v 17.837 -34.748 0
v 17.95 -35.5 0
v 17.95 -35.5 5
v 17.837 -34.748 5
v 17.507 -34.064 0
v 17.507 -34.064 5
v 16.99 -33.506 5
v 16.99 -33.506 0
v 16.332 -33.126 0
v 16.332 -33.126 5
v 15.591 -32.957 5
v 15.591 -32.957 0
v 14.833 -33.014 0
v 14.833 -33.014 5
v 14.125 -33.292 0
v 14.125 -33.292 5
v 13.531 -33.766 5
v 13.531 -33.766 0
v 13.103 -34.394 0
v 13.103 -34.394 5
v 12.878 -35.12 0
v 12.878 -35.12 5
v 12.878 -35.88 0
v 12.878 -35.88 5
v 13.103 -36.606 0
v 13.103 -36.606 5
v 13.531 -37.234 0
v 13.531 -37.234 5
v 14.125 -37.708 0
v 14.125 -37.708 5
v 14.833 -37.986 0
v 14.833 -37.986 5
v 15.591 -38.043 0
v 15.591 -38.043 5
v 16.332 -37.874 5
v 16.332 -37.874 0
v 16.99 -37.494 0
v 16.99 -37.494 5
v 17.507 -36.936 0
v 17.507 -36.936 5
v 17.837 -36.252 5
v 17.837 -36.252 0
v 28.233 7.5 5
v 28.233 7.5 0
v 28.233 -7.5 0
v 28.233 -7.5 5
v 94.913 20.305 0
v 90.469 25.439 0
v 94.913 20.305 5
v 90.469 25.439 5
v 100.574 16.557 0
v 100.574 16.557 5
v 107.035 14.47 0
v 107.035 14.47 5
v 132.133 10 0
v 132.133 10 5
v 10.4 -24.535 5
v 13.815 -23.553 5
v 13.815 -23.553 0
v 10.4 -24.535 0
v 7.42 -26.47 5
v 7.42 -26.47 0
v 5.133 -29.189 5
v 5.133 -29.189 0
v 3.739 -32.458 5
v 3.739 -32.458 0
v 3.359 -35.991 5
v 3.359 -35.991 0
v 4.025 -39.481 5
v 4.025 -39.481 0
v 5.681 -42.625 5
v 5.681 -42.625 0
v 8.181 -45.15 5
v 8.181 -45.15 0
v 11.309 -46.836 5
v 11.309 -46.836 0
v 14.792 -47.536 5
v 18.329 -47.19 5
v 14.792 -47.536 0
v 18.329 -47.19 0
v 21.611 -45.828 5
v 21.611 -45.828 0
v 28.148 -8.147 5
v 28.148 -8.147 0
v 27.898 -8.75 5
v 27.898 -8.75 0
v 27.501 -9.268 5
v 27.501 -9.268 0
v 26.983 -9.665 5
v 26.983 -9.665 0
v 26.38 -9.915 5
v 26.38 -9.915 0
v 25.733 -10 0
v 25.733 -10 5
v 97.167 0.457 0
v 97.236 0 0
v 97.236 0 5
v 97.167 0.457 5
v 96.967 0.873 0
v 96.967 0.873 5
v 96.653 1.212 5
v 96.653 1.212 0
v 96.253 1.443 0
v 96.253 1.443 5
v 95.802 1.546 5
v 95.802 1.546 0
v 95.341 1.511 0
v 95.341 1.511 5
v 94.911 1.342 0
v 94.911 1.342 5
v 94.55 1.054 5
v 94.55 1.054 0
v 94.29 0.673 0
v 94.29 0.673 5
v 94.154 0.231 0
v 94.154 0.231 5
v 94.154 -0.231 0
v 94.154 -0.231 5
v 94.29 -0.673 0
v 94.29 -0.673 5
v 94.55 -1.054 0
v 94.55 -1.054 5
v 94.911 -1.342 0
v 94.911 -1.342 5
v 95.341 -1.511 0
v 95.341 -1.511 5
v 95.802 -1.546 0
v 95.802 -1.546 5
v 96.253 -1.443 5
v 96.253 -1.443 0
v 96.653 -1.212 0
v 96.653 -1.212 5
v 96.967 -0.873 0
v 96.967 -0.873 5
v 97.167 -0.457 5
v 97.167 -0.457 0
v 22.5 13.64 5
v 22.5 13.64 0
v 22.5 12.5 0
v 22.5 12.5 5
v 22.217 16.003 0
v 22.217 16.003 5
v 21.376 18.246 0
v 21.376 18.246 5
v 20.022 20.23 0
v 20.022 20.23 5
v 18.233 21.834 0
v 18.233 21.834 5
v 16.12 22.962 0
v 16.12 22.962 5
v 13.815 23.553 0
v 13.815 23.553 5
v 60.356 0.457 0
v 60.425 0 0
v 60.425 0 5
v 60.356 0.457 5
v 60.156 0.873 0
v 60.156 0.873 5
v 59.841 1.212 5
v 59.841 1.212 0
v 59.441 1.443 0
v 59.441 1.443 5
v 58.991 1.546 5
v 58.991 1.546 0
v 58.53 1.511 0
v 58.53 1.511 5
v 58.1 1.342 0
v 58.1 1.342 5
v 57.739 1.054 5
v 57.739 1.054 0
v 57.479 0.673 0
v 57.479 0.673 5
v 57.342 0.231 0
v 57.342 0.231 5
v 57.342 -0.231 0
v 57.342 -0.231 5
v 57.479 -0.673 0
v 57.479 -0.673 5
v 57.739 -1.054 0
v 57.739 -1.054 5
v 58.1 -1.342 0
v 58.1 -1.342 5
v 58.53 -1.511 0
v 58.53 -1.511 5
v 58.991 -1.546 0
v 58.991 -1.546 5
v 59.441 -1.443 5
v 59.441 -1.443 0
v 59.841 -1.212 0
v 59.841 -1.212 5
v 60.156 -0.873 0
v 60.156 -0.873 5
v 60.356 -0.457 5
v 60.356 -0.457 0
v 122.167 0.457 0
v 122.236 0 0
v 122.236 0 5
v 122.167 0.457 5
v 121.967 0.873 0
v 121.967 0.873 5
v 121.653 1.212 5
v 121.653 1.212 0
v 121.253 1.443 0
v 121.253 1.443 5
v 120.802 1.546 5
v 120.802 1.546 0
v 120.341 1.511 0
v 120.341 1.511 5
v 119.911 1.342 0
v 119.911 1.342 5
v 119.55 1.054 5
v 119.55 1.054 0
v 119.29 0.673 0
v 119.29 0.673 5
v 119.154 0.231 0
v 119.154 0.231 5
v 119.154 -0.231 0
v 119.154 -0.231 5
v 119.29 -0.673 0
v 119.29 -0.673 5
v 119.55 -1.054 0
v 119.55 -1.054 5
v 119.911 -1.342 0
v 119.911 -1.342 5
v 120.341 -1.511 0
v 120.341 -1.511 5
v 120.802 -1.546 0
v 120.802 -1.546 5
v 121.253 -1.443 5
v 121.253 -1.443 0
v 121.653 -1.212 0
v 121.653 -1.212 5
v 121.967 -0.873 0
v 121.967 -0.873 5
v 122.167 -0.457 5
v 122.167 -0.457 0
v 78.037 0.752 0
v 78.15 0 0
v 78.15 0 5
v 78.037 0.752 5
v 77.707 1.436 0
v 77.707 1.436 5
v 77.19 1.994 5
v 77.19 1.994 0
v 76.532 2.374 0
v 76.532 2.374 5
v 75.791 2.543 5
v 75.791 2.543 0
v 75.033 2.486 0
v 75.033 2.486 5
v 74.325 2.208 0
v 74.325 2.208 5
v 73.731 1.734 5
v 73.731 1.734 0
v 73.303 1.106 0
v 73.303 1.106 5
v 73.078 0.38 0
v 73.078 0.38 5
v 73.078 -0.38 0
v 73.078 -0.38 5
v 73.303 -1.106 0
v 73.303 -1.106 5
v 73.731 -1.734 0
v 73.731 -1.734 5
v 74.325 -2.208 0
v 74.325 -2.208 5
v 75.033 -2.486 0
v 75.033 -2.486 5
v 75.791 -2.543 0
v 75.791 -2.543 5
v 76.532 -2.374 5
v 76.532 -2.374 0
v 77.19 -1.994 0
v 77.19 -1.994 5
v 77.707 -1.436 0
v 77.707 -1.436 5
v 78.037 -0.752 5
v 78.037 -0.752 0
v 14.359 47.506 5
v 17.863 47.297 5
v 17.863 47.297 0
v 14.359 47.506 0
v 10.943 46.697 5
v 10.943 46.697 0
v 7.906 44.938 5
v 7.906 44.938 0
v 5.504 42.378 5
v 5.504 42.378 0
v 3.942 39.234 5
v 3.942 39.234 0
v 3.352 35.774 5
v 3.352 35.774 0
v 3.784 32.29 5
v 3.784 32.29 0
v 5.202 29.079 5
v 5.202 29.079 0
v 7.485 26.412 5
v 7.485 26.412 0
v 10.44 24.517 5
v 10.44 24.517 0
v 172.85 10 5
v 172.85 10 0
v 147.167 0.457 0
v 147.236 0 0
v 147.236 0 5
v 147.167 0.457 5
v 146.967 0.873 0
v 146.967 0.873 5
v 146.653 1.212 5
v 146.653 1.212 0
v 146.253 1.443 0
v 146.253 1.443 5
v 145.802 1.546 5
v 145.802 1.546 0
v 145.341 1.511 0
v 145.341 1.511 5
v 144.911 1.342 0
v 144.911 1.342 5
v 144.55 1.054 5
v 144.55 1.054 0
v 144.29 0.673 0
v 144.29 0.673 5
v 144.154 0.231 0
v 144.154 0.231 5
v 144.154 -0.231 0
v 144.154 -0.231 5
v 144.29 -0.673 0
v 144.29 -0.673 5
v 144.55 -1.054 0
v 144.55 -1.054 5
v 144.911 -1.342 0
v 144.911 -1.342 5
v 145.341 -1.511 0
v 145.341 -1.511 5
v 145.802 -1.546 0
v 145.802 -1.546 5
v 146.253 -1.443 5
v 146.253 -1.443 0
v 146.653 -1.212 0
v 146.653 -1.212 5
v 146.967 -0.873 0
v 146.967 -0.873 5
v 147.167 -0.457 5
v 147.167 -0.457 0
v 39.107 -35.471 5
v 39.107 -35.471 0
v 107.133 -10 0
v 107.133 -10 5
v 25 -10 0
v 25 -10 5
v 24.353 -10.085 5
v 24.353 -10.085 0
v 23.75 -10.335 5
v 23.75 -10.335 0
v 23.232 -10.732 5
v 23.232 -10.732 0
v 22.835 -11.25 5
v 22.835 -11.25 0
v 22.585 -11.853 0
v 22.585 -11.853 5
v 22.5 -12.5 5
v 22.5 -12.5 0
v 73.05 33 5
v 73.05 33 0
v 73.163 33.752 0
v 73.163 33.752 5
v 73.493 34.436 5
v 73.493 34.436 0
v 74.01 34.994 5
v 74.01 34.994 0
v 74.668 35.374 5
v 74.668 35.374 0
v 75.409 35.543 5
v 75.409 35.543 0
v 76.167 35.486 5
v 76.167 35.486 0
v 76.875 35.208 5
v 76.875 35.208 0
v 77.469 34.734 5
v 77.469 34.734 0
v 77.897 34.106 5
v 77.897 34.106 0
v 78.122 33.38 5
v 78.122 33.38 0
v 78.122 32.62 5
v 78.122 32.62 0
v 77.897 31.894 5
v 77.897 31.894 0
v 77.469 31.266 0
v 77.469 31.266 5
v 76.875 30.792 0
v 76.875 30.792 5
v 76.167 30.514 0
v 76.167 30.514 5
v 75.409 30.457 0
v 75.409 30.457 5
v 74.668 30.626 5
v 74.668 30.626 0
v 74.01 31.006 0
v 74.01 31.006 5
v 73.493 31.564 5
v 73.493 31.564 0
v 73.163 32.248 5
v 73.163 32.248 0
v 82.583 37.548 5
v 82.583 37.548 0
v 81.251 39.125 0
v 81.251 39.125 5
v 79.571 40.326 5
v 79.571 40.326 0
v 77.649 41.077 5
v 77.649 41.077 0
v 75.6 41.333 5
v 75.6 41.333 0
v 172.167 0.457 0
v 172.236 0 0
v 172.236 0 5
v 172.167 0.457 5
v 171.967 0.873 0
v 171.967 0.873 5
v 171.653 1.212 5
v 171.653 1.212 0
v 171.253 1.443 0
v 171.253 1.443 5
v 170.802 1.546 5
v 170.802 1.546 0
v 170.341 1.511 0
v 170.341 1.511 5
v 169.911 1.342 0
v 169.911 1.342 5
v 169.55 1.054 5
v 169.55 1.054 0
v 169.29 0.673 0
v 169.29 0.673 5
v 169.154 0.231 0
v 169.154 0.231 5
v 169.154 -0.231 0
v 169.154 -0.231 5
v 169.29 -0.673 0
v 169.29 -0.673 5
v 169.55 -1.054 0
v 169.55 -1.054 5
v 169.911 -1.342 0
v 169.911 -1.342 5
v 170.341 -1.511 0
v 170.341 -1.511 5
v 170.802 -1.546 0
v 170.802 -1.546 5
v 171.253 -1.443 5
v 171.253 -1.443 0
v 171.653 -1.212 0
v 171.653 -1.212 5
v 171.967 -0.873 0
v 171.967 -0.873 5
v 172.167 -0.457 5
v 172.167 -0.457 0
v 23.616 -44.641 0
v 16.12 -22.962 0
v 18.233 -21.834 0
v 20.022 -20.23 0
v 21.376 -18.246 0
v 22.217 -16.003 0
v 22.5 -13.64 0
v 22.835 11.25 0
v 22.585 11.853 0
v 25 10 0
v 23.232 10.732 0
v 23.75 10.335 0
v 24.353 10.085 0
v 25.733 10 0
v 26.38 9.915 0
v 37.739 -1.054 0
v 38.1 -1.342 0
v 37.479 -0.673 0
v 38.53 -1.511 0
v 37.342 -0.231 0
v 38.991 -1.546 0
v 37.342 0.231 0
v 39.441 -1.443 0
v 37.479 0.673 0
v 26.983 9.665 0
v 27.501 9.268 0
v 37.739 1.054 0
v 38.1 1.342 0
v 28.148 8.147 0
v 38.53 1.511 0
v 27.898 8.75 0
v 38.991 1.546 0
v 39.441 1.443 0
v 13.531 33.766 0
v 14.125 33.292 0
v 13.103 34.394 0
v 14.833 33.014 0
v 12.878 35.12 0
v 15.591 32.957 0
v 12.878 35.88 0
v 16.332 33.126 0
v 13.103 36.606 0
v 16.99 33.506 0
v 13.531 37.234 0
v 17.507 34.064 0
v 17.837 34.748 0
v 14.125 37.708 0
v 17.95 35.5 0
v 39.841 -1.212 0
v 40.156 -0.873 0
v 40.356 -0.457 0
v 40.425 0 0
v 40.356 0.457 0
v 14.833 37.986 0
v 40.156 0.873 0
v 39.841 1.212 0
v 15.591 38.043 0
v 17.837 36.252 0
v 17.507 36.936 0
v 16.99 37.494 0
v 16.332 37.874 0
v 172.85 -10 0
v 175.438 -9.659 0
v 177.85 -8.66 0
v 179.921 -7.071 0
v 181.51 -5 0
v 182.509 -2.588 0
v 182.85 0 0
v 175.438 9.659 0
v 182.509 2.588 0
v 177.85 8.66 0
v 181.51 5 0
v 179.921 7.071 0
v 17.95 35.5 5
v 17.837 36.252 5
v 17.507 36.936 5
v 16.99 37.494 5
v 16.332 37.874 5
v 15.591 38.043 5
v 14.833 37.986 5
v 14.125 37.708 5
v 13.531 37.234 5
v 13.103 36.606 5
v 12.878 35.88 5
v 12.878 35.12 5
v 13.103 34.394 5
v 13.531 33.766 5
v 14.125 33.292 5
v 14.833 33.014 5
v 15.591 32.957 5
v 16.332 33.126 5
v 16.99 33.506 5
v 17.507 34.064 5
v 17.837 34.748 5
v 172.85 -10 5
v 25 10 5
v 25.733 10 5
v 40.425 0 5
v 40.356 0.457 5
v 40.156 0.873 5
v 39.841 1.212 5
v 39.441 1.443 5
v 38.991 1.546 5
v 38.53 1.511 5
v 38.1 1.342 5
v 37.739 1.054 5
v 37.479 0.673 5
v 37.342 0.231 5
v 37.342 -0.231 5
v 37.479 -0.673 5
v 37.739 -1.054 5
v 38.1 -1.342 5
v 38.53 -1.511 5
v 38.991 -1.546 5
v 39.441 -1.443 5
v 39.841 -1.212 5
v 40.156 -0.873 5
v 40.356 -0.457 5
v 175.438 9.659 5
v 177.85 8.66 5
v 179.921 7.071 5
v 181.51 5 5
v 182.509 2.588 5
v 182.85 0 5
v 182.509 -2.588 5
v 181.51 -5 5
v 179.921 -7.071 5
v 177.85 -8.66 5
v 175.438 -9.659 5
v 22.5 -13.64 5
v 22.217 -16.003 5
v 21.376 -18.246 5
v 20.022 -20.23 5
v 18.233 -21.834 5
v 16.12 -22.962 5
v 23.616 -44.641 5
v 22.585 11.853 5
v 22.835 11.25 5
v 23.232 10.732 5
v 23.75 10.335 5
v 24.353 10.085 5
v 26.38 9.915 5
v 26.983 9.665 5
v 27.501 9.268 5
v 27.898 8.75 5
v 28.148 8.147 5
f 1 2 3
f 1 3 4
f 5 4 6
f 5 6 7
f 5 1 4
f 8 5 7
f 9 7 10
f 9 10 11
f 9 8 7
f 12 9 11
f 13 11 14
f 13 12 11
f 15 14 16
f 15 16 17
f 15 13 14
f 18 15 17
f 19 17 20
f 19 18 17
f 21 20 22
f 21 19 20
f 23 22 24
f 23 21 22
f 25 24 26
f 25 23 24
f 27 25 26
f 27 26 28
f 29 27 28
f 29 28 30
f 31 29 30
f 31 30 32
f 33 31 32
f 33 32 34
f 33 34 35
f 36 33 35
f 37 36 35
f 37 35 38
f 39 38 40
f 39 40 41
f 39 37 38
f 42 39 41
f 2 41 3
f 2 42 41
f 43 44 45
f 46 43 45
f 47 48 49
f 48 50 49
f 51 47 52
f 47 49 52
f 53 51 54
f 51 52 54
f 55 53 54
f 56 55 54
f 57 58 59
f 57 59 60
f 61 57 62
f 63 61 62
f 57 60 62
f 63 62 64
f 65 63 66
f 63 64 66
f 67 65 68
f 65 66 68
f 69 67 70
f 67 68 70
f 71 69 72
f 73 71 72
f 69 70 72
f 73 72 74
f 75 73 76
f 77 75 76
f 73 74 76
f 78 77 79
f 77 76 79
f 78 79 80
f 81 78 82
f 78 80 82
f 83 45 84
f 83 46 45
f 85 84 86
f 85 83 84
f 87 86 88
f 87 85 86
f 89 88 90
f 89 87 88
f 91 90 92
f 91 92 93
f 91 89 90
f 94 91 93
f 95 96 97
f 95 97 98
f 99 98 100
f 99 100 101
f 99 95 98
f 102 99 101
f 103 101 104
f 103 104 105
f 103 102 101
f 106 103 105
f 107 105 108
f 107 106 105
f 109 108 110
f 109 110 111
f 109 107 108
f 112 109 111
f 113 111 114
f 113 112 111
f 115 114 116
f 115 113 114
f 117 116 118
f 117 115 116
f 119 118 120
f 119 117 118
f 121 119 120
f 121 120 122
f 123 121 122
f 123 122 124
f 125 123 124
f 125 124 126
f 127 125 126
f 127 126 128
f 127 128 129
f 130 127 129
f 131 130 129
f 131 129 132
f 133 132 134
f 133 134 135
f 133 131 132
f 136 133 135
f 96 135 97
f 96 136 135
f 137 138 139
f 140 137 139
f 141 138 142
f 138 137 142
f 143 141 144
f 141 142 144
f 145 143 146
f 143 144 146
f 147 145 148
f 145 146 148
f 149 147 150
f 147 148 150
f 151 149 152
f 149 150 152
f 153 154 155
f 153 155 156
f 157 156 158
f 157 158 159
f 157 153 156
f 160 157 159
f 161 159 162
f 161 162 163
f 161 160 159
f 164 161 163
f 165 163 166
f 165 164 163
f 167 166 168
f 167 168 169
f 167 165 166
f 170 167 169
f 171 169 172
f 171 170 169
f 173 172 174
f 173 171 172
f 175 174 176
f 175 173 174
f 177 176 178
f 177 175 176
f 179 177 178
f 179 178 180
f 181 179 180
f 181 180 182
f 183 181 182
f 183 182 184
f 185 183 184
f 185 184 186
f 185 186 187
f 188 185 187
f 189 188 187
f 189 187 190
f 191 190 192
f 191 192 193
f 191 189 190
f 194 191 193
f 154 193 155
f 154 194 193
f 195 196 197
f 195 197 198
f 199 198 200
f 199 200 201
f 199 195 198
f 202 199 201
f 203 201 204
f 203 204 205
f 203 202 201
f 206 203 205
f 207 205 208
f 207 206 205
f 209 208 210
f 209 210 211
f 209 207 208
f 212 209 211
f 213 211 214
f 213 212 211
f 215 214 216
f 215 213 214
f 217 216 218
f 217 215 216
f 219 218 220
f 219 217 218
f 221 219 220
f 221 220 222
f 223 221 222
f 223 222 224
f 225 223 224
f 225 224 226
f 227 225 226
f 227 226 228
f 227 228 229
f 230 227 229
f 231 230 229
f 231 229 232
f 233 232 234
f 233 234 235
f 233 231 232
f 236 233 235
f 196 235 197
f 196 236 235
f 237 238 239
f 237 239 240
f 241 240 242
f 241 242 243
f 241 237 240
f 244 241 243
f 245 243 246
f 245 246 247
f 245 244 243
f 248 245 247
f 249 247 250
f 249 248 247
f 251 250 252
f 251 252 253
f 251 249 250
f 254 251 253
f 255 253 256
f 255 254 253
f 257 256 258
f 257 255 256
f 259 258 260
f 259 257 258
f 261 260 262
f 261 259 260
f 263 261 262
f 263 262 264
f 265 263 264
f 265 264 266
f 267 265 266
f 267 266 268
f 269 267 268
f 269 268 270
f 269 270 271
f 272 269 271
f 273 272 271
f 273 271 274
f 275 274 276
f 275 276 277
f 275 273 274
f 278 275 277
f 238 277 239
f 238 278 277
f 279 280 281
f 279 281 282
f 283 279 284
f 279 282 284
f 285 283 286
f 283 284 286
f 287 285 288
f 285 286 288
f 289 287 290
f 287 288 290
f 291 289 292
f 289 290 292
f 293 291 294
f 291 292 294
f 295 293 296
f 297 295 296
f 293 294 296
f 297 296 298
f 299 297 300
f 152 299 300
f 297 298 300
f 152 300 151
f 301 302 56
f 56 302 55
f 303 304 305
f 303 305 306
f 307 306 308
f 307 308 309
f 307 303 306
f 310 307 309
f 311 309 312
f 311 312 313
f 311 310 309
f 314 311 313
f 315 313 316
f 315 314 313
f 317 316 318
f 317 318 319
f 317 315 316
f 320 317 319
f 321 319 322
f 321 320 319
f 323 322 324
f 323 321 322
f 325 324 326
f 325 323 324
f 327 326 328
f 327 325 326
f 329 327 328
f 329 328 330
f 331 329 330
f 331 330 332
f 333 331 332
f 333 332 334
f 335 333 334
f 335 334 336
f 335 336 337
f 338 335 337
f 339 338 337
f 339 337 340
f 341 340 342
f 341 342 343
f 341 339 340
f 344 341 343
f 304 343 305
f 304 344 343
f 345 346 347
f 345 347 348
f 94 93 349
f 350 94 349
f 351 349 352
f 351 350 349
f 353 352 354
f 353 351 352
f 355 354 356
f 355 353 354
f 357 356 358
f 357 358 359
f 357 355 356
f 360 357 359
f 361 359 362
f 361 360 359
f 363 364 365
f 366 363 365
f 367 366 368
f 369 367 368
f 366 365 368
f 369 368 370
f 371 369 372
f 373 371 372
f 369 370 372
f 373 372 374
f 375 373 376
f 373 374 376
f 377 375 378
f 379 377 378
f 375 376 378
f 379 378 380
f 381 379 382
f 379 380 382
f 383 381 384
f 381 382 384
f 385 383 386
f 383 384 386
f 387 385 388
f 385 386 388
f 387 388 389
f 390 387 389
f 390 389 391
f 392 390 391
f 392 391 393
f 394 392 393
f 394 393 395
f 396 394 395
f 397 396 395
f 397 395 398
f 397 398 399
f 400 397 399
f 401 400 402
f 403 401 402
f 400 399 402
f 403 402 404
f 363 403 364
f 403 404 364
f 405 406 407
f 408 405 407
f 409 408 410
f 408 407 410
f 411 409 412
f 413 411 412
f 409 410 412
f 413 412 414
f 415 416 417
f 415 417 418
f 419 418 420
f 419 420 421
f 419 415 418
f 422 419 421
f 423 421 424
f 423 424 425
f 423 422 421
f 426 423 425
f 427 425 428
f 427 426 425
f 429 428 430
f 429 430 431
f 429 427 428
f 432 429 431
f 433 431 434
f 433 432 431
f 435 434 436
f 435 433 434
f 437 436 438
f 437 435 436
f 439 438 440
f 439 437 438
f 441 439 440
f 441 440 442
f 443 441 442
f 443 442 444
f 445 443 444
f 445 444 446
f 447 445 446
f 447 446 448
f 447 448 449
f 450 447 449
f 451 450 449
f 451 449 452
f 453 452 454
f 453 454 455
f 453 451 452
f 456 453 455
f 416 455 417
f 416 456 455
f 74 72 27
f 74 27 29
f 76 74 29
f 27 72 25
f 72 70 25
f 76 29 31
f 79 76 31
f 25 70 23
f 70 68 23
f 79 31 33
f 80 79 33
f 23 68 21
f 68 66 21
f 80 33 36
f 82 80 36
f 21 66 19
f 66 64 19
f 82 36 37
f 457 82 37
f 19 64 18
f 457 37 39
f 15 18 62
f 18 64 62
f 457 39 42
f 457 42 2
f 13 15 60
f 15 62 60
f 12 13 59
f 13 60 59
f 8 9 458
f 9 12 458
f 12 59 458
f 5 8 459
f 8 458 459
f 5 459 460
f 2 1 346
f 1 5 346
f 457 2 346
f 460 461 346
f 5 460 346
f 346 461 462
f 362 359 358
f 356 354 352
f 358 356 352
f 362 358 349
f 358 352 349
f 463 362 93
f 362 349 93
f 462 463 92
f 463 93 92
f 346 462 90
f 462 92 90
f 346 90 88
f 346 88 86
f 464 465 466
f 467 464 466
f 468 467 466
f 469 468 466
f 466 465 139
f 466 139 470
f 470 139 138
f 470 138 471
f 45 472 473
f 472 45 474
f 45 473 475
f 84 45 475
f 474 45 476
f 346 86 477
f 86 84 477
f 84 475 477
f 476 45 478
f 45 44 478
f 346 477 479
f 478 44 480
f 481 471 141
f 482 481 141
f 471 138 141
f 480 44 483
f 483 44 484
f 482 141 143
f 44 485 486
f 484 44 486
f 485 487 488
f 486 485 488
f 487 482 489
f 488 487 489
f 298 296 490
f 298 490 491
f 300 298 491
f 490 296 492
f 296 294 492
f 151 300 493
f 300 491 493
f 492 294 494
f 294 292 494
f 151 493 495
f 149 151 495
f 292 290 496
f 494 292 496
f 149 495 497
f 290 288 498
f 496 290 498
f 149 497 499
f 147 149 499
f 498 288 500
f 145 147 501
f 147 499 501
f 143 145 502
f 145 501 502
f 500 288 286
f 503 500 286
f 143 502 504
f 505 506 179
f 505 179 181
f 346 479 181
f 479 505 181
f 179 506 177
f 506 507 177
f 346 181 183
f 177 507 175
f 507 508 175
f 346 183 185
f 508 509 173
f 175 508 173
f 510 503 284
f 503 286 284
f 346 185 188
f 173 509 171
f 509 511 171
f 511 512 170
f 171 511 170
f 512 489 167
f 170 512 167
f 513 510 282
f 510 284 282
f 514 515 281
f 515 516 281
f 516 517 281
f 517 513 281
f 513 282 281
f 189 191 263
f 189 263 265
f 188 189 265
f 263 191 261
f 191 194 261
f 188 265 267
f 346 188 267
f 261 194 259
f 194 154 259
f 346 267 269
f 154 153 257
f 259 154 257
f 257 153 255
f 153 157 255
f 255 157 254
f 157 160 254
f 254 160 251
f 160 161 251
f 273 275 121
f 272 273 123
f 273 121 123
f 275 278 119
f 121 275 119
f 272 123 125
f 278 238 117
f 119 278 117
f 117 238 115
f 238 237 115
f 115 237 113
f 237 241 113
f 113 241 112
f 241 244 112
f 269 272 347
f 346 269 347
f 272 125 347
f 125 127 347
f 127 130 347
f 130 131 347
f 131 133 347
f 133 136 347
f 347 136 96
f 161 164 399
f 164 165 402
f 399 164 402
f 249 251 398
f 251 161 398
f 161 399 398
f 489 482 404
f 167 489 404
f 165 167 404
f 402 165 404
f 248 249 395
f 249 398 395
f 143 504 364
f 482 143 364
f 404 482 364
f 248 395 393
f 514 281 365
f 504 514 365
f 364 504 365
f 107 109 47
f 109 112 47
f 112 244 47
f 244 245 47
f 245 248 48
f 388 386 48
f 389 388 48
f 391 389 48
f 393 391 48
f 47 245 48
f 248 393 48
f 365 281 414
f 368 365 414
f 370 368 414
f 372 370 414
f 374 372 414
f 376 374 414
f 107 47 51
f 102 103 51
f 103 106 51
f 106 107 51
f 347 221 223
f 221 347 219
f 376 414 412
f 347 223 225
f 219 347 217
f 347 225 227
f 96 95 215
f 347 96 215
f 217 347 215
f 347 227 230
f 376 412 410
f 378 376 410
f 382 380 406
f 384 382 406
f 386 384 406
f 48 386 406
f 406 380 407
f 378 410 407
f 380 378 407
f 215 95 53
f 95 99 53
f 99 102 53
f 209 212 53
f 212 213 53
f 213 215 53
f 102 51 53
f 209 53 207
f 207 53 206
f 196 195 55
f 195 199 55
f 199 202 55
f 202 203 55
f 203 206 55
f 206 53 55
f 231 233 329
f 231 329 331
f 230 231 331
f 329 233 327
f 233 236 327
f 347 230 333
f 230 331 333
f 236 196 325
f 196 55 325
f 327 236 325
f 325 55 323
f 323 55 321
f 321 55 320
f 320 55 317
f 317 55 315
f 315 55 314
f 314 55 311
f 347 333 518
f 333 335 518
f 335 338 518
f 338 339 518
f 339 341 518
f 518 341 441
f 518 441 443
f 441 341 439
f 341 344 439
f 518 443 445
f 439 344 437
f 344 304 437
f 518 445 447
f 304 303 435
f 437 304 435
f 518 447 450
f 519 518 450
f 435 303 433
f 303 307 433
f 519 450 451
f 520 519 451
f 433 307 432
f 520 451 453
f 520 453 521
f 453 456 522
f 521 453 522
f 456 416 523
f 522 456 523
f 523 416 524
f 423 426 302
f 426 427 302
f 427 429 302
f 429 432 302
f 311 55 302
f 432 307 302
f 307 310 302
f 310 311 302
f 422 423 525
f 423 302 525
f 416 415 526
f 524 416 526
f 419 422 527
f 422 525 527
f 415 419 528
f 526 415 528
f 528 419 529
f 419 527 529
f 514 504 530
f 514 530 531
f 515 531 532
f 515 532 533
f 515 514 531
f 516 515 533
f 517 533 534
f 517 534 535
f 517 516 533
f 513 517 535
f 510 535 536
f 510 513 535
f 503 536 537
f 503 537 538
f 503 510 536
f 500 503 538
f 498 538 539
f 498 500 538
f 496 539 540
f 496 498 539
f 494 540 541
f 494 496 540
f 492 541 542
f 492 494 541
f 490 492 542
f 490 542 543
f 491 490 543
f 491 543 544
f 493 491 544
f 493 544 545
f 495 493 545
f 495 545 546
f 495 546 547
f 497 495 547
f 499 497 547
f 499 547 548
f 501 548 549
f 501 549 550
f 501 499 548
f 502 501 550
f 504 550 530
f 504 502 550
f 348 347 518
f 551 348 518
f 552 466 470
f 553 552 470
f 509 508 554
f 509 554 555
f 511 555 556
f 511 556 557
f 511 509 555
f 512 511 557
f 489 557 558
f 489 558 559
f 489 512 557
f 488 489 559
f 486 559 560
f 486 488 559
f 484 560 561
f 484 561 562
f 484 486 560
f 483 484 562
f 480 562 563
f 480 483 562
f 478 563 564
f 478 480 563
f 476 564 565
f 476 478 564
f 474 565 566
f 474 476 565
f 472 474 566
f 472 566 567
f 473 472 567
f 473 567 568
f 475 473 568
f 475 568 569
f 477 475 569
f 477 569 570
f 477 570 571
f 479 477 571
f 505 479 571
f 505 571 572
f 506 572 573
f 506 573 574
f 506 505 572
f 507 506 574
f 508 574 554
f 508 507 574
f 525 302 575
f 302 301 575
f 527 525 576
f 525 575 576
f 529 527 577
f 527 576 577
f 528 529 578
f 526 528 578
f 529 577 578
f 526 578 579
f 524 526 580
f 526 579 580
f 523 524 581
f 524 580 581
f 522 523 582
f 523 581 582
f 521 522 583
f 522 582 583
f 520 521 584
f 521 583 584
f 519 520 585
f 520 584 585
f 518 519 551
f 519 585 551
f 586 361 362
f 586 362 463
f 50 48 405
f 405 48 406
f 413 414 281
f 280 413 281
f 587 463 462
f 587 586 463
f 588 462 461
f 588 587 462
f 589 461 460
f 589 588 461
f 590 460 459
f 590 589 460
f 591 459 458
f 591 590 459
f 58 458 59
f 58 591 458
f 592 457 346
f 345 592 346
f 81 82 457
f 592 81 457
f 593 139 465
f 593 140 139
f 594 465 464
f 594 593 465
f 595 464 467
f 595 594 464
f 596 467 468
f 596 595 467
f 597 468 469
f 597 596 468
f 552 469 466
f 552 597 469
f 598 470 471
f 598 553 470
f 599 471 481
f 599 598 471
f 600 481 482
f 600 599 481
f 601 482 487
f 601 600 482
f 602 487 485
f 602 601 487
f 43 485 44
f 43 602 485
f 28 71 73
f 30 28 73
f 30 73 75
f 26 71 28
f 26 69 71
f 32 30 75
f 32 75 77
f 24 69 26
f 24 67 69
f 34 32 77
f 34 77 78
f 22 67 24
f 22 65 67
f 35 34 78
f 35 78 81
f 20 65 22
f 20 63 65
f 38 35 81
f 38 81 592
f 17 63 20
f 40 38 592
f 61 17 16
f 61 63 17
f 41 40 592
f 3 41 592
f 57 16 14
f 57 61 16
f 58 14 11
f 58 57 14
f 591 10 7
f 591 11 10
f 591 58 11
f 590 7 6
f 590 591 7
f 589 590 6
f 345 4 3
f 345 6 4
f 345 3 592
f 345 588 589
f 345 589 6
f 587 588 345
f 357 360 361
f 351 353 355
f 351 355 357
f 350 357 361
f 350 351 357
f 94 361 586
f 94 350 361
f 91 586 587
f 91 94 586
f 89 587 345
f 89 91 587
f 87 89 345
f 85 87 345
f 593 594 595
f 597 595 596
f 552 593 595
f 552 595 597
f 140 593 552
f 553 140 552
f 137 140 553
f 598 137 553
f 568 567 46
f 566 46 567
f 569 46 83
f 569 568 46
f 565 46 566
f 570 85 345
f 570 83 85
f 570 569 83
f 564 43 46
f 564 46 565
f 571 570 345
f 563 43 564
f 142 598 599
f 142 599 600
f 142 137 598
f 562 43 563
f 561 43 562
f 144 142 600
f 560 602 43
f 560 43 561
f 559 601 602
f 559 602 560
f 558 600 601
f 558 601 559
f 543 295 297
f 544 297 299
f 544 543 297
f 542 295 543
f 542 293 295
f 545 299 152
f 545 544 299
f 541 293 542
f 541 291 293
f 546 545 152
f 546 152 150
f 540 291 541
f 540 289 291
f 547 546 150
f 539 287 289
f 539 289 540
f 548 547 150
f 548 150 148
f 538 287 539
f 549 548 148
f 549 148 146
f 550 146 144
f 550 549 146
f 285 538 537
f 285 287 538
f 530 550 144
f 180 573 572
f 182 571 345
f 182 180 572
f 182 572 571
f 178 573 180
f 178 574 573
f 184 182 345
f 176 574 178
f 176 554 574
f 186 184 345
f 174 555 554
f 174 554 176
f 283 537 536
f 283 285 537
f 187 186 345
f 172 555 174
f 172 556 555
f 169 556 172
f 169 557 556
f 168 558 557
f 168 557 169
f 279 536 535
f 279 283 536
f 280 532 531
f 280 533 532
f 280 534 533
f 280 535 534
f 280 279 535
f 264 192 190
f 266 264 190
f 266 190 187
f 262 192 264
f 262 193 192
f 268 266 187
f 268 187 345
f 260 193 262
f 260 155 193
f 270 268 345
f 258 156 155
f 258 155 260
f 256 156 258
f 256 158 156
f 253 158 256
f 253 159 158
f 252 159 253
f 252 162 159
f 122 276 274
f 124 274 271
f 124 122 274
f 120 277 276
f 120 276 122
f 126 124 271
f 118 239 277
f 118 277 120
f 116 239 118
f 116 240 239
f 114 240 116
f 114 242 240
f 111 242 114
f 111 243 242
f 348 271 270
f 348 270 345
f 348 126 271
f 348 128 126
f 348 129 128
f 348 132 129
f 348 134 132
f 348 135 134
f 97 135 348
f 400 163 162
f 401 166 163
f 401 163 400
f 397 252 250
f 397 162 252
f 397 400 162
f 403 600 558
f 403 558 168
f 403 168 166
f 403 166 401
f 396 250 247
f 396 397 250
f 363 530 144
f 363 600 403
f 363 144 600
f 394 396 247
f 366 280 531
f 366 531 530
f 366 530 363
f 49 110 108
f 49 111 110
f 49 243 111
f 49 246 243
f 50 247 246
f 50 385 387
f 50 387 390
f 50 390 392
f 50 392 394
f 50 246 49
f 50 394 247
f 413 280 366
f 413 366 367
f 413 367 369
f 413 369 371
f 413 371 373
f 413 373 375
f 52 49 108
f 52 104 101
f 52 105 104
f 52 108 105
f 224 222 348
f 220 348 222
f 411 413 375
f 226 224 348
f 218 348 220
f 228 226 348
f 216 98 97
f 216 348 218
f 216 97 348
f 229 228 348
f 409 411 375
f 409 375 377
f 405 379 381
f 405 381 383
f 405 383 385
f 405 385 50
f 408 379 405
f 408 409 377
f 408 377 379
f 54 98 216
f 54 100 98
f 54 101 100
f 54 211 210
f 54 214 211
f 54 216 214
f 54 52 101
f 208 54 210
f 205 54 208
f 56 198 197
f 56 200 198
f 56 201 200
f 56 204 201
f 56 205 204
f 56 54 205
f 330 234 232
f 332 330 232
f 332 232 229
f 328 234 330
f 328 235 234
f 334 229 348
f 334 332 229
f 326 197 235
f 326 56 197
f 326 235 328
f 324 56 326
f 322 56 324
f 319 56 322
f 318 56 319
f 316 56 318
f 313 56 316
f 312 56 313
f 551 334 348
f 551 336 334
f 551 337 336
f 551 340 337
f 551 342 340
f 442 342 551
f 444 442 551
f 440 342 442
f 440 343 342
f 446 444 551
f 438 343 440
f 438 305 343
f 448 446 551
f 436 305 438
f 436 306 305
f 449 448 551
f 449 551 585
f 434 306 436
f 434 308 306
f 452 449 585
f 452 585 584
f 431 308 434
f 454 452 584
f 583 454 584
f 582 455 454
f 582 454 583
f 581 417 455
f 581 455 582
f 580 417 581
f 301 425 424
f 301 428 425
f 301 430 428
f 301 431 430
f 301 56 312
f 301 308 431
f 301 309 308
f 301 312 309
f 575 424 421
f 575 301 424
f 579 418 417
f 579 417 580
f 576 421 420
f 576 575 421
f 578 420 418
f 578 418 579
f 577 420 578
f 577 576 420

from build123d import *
from OCP.BRepFilletAPI import BRepFilletAPI_MakeChamfer

# Parameters (mm, degrees)
CROQUIS1_R              = 1.549999999999994
CROQUIS1_R_2            = 2.5499999999999923
CROQUIS1_R_3            = 2.5500000000020107
CROQUIS1_R_4            = 2.5499999999987524
CROQUIS1_R_5            = 1.5500000000000012
SALIENTE_EXTRUIR1_DEPTH = 5
REDONDEO1_R             = 10
REDONDEO2_R             = 10
REDONDEO4_R             = 2.5
CHAFL_N1_SIZE           = 50
CHAFL_N1_SIZE2          = 25
CROQUIS2_R              = 2.5499999999999914
SALIENTE_EXTRUIR2_DEPTH = 5
REDONDEO5_R             = 25


with BuildPart() as part:
    # Croquis1 → Saliente-Extruir1 (new body)
    with BuildSketch(Plane.XY):
        with BuildLine():
            Line((22.499999999999602, 23.448771432804598), (22.499999999999606, 10.00000000000557))
            Line((22.499999999999606, 10.00000000000557), (28.23305122348206, 10.00000000000557))
            Line((28.23305122348206, 10.00000000000557), (28.233051223482065, -9.999999999994426))
            Line((28.233051223482065, -9.999999999994426), (22.49999999999961, -9.99999999999443))
            Line((22.49999999999961, -9.99999999999443), (22.49999999999961, -20.499999999994426))
            Line((22.49999999999961, -20.499999999994426), (22.49999999999961, -23.448771432804598))
            Line((22.49999999999961, -23.448771432804598), (15.3999999999996, -23.448771432804598))
            ThreePointArc((15.3999999999996, -23.448771432804598), (3.787647475656714, -38.722635385727685), (21.610549895016423, -45.827689963420795))
            Line((21.610549895016423, -45.827689963420795), (23.615707001015654, -44.64130534237437))
            Line((23.615707001015654, -44.64130534237437), (79.74064487017472, -11.416377836244111))
            Line((79.74064487017472, -11.416377836244111), (82.13324958071296, -10))
            Line((82.13324958071296, -10), (182.8500644459697, -9.999999999999998))
            Line((182.8500644459697, -9.999999999999998), (182.8500644459697, 9.999999999999998))
            Line((182.8500644459697, 9.999999999999998), (87.50000000000001, 9.999999999999998))
            Line((87.50000000000001, 9.999999999999998), (82.13324958071296, 9.999999999999998))
            Line((82.13324958071296, 9.999999999999998), (23.615707001015654, 44.64130534237437))
            Line((23.615707001015654, 44.64130534237437), (21.610549895016423, 45.827689963420795))
            ThreePointArc((21.610549895016423, 45.827689963420795), (3.787647475656714, 38.722635385727685), (15.3999999999996, 23.448771432804598))
            Line((15.3999999999996, 23.448771432804598), (22.499999999999602, 23.448771432804598))
        make_face()
        with Locations((170.68634124367938, 0)):
            Circle(CROQUIS1_R, mode=Mode.SUBTRACT)
        with Locations((75.6, 0)):
            Circle(CROQUIS1_R_2, mode=Mode.SUBTRACT)
        with Locations((15.3999999999996, -35.50000000000558)):
            Circle(CROQUIS1_R_3, mode=Mode.SUBTRACT)
        with Locations((15.3999999999996, 35.50000000000558)):
            Circle(CROQUIS1_R_4, mode=Mode.SUBTRACT)
        with Locations((95.6863412436794, 0)):
            Circle(CROQUIS1_R, mode=Mode.SUBTRACT)
        with Locations((145.68634124367938, 0)):
            Circle(CROQUIS1_R, mode=Mode.SUBTRACT)
        with Locations((120.68634124367938, 0)):
            Circle(CROQUIS1_R, mode=Mode.SUBTRACT)
        with Locations((38.875017115898416, 0)):
            Circle(CROQUIS1_R_5, mode=Mode.SUBTRACT)
        with Locations((58.875017115898416, -1.73e-15)):
            Circle(CROQUIS1_R_5, mode=Mode.SUBTRACT)
    extrude(amount=SALIENTE_EXTRUIR1_DEPTH)

    # Redondeo1
    redondeo1_edges = [part.edges().sort_by_distance(p)[0] for p in [
        (22.49999999999961, -23.448771432804598, 2.5),
        (22.499999999999602, 23.448771432804598, 2.5),
    ]]
    fillet(redondeo1_edges, radius=REDONDEO1_R)

    # Redondeo2
    redondeo2_edges = [part.edges().sort_by_distance(p)[0] for p in [
        (182.8500644459697, -9.999999999999998, 2.5),
        (182.8500644459697, 9.999999999999998, 2.5),
    ]]
    fillet(redondeo2_edges, radius=REDONDEO2_R - 0.0001)  # a hair under: the kernel refuses the full size

    # Redondeo4
    redondeo4_edges = [part.edges().sort_by_distance(p)[0] for p in [
        (22.49999999999961, -9.99999999999443, 2.5),
        (28.233051223482065, -9.999999999994426, 2.5),
        (28.23305122348206, 10.00000000000557, 2.5),
        (22.499999999999606, 10.00000000000557, 2.5),
    ]]
    fillet(redondeo4_edges, radius=REDONDEO4_R)

    # Chaflán1: one chamfer whose edges measure the first distance from different faces: ONE call of the kernel's chamfer builder (chamfer() names one face for all edges)
    chafl_n1_edges_1 = [part.edges().sort_by_distance(p)[0] for p in [
        (82.13324958071296, 9.999999999999998, 2.5),
    ]]
    chafl_n1_side_1 = [part.faces().sort_by_distance(p)[0] for p in [
        (127.49170701334134, 9.999999999999998, 2.5),
    ]]
    chafl_n1_edges_2 = [part.edges().sort_by_distance(p)[0] for p in [
        (82.13324958071296, -10, 2.5),
    ]]
    chafl_n1_side_2 = [part.faces().sort_by_distance(p)[0] for p in [
        (52.874478290864296, -27.320652671187155, 2.5),
    ]]
    chafl_n1 = BRepFilletAPI_MakeChamfer(part.part.solid().wrapped)
    for e in chafl_n1_edges_1:
        chafl_n1.Add(CHAFL_N1_SIZE, CHAFL_N1_SIZE2, e.wrapped, chafl_n1_side_1[0].wrapped)  # the first distance lies on this face
    for e in chafl_n1_edges_2:
        chafl_n1.Add(CHAFL_N1_SIZE, CHAFL_N1_SIZE2, e.wrapped, chafl_n1_side_2[0].wrapped)  # the first distance lies on this face
    add(Compound.cast(chafl_n1.Shape()), mode=Mode.REPLACE)

    # Croquis2 → Saliente-Extruir2 (add)
    with BuildSketch(Plane(origin=(0, 0, 0), x_dir=(-1, 0, 0), z_dir=(0, 0, -1))):
        with BuildLine():
            Line((-96.37672384904373, 16.36766473551684), (-82.582860744419, 37.547706950275206))
            ThreePointArc((-82.582860744419, 37.547706950275206), (-79.57146676248833, 40.32594256297316), (-75.59999999999961, 41.33318562624969))
            Line((-75.59999999999961, 41.33318562624969), (-15.399999999999643, 47.55122856720654))
            Line((-15.399999999999643, 47.55122856720654), (-60.62019811737546, 22.735329471033683))
            Line((-60.62019811737546, 22.735329471033683), (-96.37672384904373, 16.36766473551684))
        make_face()
        with Locations((-75.59999999999961, 33)):
            Circle(CROQUIS2_R, mode=Mode.SUBTRACT)
    extrude(amount=-SALIENTE_EXTRUIR2_DEPTH)

    # Redondeo5
    redondeo5_edges = [part.edges().sort_by_distance(p)[0] for p in [
        (96.37672384904373, 16.36766473551684, 2.5),
    ]]
    fillet(redondeo5_edges, radius=REDONDEO5_R)


solid = part.part
